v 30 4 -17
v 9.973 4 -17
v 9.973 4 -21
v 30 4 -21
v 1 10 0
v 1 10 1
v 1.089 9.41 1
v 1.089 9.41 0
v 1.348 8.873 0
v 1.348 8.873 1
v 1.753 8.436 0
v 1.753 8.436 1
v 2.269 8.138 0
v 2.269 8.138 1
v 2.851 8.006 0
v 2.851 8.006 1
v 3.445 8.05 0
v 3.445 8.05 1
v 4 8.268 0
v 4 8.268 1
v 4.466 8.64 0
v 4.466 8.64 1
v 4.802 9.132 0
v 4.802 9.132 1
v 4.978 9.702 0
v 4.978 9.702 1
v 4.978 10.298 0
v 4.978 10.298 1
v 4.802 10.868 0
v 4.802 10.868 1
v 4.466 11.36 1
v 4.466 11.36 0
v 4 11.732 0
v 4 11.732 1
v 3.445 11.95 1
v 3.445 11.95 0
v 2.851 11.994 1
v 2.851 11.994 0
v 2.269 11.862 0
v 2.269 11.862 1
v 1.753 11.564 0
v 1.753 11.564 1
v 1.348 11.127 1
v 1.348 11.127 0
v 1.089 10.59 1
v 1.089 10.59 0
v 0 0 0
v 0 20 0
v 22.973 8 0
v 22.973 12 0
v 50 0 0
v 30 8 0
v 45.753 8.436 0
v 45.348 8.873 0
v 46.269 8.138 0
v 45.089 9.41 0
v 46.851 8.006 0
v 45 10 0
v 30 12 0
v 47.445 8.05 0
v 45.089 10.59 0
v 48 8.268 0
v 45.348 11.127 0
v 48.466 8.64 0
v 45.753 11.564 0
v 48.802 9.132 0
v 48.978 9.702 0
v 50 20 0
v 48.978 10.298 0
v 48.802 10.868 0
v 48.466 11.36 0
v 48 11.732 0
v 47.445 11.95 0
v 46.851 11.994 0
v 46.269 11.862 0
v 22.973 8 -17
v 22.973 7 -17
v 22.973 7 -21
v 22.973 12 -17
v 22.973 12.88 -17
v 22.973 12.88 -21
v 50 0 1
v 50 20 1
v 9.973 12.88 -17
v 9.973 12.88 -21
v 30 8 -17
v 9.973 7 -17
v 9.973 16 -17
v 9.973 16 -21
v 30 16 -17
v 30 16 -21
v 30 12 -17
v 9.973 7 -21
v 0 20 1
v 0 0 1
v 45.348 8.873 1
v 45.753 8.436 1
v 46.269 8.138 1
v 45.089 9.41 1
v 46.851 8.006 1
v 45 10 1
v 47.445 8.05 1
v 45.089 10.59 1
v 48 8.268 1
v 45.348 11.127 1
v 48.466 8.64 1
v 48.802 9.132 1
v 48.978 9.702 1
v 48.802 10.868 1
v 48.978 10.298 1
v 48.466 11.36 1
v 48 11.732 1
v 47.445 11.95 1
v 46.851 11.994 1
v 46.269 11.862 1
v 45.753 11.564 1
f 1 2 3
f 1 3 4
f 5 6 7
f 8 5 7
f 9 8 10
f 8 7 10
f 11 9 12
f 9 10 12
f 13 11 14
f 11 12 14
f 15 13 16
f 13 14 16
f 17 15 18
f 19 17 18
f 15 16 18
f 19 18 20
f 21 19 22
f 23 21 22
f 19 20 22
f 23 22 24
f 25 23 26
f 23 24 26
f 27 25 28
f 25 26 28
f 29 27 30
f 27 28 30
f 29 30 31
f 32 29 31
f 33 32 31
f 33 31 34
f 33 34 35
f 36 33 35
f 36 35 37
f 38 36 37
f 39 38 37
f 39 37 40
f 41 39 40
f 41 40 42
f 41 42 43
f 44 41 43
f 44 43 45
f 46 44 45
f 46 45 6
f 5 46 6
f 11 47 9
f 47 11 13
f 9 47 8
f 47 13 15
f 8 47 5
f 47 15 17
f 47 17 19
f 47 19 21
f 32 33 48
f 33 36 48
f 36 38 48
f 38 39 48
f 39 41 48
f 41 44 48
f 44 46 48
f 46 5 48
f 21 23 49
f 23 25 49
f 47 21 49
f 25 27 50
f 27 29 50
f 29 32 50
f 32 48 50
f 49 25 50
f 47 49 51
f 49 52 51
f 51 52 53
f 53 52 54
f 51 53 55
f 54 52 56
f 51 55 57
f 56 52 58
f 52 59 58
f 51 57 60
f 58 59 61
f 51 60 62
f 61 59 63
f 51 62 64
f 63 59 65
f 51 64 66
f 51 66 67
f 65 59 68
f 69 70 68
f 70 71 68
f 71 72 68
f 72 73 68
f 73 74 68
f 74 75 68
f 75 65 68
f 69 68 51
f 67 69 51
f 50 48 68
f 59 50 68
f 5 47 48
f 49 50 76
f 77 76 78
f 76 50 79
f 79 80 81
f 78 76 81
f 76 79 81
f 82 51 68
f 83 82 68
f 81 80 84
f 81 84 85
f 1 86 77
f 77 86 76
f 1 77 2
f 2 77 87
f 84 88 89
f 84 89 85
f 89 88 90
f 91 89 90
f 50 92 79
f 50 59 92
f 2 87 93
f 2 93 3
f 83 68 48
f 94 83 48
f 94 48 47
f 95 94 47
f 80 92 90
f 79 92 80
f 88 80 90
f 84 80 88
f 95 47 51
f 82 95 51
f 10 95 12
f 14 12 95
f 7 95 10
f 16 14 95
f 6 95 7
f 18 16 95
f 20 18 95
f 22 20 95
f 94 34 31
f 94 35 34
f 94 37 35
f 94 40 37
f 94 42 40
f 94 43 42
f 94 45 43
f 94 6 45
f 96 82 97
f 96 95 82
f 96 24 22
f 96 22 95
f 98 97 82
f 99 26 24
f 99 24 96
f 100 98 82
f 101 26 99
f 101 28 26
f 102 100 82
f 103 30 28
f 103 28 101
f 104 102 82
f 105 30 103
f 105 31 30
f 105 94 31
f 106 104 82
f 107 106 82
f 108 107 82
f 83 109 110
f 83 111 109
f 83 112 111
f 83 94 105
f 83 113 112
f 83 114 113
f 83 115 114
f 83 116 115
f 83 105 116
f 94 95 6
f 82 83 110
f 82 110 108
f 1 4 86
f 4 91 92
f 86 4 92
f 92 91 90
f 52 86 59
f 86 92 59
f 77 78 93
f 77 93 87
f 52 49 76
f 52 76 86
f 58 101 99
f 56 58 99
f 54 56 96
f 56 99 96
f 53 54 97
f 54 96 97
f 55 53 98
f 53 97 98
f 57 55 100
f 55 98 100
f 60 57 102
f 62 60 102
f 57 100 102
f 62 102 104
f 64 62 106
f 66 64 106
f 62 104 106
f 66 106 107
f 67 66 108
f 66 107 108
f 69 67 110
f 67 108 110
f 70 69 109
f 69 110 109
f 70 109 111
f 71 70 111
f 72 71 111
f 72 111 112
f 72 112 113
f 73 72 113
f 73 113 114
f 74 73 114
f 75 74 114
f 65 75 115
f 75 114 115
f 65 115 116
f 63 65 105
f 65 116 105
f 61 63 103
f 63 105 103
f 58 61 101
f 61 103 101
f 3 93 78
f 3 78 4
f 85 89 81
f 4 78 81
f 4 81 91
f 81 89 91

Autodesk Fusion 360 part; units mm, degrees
sketch "Sketch1" plane through (0, 0, 0) normal (0, 0, 1) x (1, 0, 0)
  line L0 (0, 0) -> (50, 0)
  line L1 (50, 0) -> (50, 20)
  line L2 (50, 20) -> (0, 20)
  line L3 (0, 20) -> (0, 0)
  dimension "d1" = 50
  dimension "d2" = 20
extrude "Extrude1" add sketch "Sketch1" along normal blind 1
sketch "Sketch2" plane through (0, 0, 1) normal (0, 0, 1) x (-1, 0, 0)
  line L0 (0, -20) -> (0, 0)
  line L1 (0, 0) -> (-50, 0)
  line L2 (-50, 0) -> (-50, -20)
  line L3 (-50, -20) -> (0, -20)
  circle A0 centre (-3, -10) radius 2
  circle A1 centre (-47, -10) radius 2
  dimension "d8" = 4
  dimension "d19" = 4
extrude "Extrude2" cut sketch "Sketch2" against normal blind 7 contours A0 | A1
sketch "Sketch3" plane through (0, 0, 0) normal (0, 0, -1) x (1, 0, 0)
  circle A0 centre (3, -10) radius 2
  line L0 (0, 0) -> (0, -20)
  line L1 (0, -20) -> (50, -20)
  line L2 (50, -20) -> (50, 0)
  line L3 (50, 0) -> (0, 0)
  line L4 (22.9728, -8) -> (30, -8)
  line L5 (30, -8) -> (30, -12)
  line L6 (30, -12) -> (22.9728, -12)
  line L7 (22.9728, -12) -> (22.9728, -8)
  circle A1 centre (46, -10) radius 2
  circle A2 centre (47, -10) radius 2
extrude "Extrude3" add sketch "Sketch3" along normal blind 21 contours L4 L5 L6 L7
sketch "Sketch6" plane through (0, 8, 0) normal (0, -1, 0) x (1, 0, 0)
  line L0 (30, 0) -> (22.9728, 0)
  line L1 (22.9728, 0) -> (22.9728, -21)
  line L2 (22.9728, -21) -> (30, -21)
  line L3 (30, -21) -> (30, 0)
  line L4 (22.9728, -21) -> (30, -21)
  line L5 (30, -21) -> (30, -17)
  line L6 (30, -17) -> (22.9728, -17)
  line L7 (22.9728, -17) -> (22.9728, -21)
extrude "Extrude4" add sketch "Sketch6" along normal blind 4 contours L1 L2 L3 L4 L5 L6 L7
extrude "Extrude5" add sketch "Sketch6" against normal blind 8 contours L1 L2 L3 L4 L5 L6 L7
sketch "Sketch7" plane through (22.9728, 0, 0) normal (-1, 0, 0) x (0, -1, 0)
  line L0 (-16, -21) -> (-4, -21)
  line L1 (-4, -21) -> (-4, -17)
  line L2 (-4, -17) -> (-8, -17)
  line L3 (-8, -17) -> (-8, 0)
  line L4 (-8, 0) -> (-12, 0)
  line L5 (-12, 0) -> (-12, -17)
  line L6 (-12, -17) -> (-16, -17)
  line L7 (-16, -17) -> (-16, -21)
  line L8 (-16, -17) -> (-12.8799, -17)
  line L9 (-12.8799, -17) -> (-12.8799, -21)
  line L10 (-12.8799, -21) -> (-16, -21)
  line L11 (-16, -21) -> (-16, -17)
  line L12 (-4, -21) -> (-7, -21)
  line L13 (-7, -21) -> (-7, -17)
  line L14 (-7, -17) -> (-4, -17)
  line L15 (-4, -17) -> (-4, -21)
extrude "Extrude6" add sketch "Sketch7" along normal blind 13 contours L0 L6 L7 L8 L9 L10 L11 | L0 L1 L2 L12 L13 L14 L15
